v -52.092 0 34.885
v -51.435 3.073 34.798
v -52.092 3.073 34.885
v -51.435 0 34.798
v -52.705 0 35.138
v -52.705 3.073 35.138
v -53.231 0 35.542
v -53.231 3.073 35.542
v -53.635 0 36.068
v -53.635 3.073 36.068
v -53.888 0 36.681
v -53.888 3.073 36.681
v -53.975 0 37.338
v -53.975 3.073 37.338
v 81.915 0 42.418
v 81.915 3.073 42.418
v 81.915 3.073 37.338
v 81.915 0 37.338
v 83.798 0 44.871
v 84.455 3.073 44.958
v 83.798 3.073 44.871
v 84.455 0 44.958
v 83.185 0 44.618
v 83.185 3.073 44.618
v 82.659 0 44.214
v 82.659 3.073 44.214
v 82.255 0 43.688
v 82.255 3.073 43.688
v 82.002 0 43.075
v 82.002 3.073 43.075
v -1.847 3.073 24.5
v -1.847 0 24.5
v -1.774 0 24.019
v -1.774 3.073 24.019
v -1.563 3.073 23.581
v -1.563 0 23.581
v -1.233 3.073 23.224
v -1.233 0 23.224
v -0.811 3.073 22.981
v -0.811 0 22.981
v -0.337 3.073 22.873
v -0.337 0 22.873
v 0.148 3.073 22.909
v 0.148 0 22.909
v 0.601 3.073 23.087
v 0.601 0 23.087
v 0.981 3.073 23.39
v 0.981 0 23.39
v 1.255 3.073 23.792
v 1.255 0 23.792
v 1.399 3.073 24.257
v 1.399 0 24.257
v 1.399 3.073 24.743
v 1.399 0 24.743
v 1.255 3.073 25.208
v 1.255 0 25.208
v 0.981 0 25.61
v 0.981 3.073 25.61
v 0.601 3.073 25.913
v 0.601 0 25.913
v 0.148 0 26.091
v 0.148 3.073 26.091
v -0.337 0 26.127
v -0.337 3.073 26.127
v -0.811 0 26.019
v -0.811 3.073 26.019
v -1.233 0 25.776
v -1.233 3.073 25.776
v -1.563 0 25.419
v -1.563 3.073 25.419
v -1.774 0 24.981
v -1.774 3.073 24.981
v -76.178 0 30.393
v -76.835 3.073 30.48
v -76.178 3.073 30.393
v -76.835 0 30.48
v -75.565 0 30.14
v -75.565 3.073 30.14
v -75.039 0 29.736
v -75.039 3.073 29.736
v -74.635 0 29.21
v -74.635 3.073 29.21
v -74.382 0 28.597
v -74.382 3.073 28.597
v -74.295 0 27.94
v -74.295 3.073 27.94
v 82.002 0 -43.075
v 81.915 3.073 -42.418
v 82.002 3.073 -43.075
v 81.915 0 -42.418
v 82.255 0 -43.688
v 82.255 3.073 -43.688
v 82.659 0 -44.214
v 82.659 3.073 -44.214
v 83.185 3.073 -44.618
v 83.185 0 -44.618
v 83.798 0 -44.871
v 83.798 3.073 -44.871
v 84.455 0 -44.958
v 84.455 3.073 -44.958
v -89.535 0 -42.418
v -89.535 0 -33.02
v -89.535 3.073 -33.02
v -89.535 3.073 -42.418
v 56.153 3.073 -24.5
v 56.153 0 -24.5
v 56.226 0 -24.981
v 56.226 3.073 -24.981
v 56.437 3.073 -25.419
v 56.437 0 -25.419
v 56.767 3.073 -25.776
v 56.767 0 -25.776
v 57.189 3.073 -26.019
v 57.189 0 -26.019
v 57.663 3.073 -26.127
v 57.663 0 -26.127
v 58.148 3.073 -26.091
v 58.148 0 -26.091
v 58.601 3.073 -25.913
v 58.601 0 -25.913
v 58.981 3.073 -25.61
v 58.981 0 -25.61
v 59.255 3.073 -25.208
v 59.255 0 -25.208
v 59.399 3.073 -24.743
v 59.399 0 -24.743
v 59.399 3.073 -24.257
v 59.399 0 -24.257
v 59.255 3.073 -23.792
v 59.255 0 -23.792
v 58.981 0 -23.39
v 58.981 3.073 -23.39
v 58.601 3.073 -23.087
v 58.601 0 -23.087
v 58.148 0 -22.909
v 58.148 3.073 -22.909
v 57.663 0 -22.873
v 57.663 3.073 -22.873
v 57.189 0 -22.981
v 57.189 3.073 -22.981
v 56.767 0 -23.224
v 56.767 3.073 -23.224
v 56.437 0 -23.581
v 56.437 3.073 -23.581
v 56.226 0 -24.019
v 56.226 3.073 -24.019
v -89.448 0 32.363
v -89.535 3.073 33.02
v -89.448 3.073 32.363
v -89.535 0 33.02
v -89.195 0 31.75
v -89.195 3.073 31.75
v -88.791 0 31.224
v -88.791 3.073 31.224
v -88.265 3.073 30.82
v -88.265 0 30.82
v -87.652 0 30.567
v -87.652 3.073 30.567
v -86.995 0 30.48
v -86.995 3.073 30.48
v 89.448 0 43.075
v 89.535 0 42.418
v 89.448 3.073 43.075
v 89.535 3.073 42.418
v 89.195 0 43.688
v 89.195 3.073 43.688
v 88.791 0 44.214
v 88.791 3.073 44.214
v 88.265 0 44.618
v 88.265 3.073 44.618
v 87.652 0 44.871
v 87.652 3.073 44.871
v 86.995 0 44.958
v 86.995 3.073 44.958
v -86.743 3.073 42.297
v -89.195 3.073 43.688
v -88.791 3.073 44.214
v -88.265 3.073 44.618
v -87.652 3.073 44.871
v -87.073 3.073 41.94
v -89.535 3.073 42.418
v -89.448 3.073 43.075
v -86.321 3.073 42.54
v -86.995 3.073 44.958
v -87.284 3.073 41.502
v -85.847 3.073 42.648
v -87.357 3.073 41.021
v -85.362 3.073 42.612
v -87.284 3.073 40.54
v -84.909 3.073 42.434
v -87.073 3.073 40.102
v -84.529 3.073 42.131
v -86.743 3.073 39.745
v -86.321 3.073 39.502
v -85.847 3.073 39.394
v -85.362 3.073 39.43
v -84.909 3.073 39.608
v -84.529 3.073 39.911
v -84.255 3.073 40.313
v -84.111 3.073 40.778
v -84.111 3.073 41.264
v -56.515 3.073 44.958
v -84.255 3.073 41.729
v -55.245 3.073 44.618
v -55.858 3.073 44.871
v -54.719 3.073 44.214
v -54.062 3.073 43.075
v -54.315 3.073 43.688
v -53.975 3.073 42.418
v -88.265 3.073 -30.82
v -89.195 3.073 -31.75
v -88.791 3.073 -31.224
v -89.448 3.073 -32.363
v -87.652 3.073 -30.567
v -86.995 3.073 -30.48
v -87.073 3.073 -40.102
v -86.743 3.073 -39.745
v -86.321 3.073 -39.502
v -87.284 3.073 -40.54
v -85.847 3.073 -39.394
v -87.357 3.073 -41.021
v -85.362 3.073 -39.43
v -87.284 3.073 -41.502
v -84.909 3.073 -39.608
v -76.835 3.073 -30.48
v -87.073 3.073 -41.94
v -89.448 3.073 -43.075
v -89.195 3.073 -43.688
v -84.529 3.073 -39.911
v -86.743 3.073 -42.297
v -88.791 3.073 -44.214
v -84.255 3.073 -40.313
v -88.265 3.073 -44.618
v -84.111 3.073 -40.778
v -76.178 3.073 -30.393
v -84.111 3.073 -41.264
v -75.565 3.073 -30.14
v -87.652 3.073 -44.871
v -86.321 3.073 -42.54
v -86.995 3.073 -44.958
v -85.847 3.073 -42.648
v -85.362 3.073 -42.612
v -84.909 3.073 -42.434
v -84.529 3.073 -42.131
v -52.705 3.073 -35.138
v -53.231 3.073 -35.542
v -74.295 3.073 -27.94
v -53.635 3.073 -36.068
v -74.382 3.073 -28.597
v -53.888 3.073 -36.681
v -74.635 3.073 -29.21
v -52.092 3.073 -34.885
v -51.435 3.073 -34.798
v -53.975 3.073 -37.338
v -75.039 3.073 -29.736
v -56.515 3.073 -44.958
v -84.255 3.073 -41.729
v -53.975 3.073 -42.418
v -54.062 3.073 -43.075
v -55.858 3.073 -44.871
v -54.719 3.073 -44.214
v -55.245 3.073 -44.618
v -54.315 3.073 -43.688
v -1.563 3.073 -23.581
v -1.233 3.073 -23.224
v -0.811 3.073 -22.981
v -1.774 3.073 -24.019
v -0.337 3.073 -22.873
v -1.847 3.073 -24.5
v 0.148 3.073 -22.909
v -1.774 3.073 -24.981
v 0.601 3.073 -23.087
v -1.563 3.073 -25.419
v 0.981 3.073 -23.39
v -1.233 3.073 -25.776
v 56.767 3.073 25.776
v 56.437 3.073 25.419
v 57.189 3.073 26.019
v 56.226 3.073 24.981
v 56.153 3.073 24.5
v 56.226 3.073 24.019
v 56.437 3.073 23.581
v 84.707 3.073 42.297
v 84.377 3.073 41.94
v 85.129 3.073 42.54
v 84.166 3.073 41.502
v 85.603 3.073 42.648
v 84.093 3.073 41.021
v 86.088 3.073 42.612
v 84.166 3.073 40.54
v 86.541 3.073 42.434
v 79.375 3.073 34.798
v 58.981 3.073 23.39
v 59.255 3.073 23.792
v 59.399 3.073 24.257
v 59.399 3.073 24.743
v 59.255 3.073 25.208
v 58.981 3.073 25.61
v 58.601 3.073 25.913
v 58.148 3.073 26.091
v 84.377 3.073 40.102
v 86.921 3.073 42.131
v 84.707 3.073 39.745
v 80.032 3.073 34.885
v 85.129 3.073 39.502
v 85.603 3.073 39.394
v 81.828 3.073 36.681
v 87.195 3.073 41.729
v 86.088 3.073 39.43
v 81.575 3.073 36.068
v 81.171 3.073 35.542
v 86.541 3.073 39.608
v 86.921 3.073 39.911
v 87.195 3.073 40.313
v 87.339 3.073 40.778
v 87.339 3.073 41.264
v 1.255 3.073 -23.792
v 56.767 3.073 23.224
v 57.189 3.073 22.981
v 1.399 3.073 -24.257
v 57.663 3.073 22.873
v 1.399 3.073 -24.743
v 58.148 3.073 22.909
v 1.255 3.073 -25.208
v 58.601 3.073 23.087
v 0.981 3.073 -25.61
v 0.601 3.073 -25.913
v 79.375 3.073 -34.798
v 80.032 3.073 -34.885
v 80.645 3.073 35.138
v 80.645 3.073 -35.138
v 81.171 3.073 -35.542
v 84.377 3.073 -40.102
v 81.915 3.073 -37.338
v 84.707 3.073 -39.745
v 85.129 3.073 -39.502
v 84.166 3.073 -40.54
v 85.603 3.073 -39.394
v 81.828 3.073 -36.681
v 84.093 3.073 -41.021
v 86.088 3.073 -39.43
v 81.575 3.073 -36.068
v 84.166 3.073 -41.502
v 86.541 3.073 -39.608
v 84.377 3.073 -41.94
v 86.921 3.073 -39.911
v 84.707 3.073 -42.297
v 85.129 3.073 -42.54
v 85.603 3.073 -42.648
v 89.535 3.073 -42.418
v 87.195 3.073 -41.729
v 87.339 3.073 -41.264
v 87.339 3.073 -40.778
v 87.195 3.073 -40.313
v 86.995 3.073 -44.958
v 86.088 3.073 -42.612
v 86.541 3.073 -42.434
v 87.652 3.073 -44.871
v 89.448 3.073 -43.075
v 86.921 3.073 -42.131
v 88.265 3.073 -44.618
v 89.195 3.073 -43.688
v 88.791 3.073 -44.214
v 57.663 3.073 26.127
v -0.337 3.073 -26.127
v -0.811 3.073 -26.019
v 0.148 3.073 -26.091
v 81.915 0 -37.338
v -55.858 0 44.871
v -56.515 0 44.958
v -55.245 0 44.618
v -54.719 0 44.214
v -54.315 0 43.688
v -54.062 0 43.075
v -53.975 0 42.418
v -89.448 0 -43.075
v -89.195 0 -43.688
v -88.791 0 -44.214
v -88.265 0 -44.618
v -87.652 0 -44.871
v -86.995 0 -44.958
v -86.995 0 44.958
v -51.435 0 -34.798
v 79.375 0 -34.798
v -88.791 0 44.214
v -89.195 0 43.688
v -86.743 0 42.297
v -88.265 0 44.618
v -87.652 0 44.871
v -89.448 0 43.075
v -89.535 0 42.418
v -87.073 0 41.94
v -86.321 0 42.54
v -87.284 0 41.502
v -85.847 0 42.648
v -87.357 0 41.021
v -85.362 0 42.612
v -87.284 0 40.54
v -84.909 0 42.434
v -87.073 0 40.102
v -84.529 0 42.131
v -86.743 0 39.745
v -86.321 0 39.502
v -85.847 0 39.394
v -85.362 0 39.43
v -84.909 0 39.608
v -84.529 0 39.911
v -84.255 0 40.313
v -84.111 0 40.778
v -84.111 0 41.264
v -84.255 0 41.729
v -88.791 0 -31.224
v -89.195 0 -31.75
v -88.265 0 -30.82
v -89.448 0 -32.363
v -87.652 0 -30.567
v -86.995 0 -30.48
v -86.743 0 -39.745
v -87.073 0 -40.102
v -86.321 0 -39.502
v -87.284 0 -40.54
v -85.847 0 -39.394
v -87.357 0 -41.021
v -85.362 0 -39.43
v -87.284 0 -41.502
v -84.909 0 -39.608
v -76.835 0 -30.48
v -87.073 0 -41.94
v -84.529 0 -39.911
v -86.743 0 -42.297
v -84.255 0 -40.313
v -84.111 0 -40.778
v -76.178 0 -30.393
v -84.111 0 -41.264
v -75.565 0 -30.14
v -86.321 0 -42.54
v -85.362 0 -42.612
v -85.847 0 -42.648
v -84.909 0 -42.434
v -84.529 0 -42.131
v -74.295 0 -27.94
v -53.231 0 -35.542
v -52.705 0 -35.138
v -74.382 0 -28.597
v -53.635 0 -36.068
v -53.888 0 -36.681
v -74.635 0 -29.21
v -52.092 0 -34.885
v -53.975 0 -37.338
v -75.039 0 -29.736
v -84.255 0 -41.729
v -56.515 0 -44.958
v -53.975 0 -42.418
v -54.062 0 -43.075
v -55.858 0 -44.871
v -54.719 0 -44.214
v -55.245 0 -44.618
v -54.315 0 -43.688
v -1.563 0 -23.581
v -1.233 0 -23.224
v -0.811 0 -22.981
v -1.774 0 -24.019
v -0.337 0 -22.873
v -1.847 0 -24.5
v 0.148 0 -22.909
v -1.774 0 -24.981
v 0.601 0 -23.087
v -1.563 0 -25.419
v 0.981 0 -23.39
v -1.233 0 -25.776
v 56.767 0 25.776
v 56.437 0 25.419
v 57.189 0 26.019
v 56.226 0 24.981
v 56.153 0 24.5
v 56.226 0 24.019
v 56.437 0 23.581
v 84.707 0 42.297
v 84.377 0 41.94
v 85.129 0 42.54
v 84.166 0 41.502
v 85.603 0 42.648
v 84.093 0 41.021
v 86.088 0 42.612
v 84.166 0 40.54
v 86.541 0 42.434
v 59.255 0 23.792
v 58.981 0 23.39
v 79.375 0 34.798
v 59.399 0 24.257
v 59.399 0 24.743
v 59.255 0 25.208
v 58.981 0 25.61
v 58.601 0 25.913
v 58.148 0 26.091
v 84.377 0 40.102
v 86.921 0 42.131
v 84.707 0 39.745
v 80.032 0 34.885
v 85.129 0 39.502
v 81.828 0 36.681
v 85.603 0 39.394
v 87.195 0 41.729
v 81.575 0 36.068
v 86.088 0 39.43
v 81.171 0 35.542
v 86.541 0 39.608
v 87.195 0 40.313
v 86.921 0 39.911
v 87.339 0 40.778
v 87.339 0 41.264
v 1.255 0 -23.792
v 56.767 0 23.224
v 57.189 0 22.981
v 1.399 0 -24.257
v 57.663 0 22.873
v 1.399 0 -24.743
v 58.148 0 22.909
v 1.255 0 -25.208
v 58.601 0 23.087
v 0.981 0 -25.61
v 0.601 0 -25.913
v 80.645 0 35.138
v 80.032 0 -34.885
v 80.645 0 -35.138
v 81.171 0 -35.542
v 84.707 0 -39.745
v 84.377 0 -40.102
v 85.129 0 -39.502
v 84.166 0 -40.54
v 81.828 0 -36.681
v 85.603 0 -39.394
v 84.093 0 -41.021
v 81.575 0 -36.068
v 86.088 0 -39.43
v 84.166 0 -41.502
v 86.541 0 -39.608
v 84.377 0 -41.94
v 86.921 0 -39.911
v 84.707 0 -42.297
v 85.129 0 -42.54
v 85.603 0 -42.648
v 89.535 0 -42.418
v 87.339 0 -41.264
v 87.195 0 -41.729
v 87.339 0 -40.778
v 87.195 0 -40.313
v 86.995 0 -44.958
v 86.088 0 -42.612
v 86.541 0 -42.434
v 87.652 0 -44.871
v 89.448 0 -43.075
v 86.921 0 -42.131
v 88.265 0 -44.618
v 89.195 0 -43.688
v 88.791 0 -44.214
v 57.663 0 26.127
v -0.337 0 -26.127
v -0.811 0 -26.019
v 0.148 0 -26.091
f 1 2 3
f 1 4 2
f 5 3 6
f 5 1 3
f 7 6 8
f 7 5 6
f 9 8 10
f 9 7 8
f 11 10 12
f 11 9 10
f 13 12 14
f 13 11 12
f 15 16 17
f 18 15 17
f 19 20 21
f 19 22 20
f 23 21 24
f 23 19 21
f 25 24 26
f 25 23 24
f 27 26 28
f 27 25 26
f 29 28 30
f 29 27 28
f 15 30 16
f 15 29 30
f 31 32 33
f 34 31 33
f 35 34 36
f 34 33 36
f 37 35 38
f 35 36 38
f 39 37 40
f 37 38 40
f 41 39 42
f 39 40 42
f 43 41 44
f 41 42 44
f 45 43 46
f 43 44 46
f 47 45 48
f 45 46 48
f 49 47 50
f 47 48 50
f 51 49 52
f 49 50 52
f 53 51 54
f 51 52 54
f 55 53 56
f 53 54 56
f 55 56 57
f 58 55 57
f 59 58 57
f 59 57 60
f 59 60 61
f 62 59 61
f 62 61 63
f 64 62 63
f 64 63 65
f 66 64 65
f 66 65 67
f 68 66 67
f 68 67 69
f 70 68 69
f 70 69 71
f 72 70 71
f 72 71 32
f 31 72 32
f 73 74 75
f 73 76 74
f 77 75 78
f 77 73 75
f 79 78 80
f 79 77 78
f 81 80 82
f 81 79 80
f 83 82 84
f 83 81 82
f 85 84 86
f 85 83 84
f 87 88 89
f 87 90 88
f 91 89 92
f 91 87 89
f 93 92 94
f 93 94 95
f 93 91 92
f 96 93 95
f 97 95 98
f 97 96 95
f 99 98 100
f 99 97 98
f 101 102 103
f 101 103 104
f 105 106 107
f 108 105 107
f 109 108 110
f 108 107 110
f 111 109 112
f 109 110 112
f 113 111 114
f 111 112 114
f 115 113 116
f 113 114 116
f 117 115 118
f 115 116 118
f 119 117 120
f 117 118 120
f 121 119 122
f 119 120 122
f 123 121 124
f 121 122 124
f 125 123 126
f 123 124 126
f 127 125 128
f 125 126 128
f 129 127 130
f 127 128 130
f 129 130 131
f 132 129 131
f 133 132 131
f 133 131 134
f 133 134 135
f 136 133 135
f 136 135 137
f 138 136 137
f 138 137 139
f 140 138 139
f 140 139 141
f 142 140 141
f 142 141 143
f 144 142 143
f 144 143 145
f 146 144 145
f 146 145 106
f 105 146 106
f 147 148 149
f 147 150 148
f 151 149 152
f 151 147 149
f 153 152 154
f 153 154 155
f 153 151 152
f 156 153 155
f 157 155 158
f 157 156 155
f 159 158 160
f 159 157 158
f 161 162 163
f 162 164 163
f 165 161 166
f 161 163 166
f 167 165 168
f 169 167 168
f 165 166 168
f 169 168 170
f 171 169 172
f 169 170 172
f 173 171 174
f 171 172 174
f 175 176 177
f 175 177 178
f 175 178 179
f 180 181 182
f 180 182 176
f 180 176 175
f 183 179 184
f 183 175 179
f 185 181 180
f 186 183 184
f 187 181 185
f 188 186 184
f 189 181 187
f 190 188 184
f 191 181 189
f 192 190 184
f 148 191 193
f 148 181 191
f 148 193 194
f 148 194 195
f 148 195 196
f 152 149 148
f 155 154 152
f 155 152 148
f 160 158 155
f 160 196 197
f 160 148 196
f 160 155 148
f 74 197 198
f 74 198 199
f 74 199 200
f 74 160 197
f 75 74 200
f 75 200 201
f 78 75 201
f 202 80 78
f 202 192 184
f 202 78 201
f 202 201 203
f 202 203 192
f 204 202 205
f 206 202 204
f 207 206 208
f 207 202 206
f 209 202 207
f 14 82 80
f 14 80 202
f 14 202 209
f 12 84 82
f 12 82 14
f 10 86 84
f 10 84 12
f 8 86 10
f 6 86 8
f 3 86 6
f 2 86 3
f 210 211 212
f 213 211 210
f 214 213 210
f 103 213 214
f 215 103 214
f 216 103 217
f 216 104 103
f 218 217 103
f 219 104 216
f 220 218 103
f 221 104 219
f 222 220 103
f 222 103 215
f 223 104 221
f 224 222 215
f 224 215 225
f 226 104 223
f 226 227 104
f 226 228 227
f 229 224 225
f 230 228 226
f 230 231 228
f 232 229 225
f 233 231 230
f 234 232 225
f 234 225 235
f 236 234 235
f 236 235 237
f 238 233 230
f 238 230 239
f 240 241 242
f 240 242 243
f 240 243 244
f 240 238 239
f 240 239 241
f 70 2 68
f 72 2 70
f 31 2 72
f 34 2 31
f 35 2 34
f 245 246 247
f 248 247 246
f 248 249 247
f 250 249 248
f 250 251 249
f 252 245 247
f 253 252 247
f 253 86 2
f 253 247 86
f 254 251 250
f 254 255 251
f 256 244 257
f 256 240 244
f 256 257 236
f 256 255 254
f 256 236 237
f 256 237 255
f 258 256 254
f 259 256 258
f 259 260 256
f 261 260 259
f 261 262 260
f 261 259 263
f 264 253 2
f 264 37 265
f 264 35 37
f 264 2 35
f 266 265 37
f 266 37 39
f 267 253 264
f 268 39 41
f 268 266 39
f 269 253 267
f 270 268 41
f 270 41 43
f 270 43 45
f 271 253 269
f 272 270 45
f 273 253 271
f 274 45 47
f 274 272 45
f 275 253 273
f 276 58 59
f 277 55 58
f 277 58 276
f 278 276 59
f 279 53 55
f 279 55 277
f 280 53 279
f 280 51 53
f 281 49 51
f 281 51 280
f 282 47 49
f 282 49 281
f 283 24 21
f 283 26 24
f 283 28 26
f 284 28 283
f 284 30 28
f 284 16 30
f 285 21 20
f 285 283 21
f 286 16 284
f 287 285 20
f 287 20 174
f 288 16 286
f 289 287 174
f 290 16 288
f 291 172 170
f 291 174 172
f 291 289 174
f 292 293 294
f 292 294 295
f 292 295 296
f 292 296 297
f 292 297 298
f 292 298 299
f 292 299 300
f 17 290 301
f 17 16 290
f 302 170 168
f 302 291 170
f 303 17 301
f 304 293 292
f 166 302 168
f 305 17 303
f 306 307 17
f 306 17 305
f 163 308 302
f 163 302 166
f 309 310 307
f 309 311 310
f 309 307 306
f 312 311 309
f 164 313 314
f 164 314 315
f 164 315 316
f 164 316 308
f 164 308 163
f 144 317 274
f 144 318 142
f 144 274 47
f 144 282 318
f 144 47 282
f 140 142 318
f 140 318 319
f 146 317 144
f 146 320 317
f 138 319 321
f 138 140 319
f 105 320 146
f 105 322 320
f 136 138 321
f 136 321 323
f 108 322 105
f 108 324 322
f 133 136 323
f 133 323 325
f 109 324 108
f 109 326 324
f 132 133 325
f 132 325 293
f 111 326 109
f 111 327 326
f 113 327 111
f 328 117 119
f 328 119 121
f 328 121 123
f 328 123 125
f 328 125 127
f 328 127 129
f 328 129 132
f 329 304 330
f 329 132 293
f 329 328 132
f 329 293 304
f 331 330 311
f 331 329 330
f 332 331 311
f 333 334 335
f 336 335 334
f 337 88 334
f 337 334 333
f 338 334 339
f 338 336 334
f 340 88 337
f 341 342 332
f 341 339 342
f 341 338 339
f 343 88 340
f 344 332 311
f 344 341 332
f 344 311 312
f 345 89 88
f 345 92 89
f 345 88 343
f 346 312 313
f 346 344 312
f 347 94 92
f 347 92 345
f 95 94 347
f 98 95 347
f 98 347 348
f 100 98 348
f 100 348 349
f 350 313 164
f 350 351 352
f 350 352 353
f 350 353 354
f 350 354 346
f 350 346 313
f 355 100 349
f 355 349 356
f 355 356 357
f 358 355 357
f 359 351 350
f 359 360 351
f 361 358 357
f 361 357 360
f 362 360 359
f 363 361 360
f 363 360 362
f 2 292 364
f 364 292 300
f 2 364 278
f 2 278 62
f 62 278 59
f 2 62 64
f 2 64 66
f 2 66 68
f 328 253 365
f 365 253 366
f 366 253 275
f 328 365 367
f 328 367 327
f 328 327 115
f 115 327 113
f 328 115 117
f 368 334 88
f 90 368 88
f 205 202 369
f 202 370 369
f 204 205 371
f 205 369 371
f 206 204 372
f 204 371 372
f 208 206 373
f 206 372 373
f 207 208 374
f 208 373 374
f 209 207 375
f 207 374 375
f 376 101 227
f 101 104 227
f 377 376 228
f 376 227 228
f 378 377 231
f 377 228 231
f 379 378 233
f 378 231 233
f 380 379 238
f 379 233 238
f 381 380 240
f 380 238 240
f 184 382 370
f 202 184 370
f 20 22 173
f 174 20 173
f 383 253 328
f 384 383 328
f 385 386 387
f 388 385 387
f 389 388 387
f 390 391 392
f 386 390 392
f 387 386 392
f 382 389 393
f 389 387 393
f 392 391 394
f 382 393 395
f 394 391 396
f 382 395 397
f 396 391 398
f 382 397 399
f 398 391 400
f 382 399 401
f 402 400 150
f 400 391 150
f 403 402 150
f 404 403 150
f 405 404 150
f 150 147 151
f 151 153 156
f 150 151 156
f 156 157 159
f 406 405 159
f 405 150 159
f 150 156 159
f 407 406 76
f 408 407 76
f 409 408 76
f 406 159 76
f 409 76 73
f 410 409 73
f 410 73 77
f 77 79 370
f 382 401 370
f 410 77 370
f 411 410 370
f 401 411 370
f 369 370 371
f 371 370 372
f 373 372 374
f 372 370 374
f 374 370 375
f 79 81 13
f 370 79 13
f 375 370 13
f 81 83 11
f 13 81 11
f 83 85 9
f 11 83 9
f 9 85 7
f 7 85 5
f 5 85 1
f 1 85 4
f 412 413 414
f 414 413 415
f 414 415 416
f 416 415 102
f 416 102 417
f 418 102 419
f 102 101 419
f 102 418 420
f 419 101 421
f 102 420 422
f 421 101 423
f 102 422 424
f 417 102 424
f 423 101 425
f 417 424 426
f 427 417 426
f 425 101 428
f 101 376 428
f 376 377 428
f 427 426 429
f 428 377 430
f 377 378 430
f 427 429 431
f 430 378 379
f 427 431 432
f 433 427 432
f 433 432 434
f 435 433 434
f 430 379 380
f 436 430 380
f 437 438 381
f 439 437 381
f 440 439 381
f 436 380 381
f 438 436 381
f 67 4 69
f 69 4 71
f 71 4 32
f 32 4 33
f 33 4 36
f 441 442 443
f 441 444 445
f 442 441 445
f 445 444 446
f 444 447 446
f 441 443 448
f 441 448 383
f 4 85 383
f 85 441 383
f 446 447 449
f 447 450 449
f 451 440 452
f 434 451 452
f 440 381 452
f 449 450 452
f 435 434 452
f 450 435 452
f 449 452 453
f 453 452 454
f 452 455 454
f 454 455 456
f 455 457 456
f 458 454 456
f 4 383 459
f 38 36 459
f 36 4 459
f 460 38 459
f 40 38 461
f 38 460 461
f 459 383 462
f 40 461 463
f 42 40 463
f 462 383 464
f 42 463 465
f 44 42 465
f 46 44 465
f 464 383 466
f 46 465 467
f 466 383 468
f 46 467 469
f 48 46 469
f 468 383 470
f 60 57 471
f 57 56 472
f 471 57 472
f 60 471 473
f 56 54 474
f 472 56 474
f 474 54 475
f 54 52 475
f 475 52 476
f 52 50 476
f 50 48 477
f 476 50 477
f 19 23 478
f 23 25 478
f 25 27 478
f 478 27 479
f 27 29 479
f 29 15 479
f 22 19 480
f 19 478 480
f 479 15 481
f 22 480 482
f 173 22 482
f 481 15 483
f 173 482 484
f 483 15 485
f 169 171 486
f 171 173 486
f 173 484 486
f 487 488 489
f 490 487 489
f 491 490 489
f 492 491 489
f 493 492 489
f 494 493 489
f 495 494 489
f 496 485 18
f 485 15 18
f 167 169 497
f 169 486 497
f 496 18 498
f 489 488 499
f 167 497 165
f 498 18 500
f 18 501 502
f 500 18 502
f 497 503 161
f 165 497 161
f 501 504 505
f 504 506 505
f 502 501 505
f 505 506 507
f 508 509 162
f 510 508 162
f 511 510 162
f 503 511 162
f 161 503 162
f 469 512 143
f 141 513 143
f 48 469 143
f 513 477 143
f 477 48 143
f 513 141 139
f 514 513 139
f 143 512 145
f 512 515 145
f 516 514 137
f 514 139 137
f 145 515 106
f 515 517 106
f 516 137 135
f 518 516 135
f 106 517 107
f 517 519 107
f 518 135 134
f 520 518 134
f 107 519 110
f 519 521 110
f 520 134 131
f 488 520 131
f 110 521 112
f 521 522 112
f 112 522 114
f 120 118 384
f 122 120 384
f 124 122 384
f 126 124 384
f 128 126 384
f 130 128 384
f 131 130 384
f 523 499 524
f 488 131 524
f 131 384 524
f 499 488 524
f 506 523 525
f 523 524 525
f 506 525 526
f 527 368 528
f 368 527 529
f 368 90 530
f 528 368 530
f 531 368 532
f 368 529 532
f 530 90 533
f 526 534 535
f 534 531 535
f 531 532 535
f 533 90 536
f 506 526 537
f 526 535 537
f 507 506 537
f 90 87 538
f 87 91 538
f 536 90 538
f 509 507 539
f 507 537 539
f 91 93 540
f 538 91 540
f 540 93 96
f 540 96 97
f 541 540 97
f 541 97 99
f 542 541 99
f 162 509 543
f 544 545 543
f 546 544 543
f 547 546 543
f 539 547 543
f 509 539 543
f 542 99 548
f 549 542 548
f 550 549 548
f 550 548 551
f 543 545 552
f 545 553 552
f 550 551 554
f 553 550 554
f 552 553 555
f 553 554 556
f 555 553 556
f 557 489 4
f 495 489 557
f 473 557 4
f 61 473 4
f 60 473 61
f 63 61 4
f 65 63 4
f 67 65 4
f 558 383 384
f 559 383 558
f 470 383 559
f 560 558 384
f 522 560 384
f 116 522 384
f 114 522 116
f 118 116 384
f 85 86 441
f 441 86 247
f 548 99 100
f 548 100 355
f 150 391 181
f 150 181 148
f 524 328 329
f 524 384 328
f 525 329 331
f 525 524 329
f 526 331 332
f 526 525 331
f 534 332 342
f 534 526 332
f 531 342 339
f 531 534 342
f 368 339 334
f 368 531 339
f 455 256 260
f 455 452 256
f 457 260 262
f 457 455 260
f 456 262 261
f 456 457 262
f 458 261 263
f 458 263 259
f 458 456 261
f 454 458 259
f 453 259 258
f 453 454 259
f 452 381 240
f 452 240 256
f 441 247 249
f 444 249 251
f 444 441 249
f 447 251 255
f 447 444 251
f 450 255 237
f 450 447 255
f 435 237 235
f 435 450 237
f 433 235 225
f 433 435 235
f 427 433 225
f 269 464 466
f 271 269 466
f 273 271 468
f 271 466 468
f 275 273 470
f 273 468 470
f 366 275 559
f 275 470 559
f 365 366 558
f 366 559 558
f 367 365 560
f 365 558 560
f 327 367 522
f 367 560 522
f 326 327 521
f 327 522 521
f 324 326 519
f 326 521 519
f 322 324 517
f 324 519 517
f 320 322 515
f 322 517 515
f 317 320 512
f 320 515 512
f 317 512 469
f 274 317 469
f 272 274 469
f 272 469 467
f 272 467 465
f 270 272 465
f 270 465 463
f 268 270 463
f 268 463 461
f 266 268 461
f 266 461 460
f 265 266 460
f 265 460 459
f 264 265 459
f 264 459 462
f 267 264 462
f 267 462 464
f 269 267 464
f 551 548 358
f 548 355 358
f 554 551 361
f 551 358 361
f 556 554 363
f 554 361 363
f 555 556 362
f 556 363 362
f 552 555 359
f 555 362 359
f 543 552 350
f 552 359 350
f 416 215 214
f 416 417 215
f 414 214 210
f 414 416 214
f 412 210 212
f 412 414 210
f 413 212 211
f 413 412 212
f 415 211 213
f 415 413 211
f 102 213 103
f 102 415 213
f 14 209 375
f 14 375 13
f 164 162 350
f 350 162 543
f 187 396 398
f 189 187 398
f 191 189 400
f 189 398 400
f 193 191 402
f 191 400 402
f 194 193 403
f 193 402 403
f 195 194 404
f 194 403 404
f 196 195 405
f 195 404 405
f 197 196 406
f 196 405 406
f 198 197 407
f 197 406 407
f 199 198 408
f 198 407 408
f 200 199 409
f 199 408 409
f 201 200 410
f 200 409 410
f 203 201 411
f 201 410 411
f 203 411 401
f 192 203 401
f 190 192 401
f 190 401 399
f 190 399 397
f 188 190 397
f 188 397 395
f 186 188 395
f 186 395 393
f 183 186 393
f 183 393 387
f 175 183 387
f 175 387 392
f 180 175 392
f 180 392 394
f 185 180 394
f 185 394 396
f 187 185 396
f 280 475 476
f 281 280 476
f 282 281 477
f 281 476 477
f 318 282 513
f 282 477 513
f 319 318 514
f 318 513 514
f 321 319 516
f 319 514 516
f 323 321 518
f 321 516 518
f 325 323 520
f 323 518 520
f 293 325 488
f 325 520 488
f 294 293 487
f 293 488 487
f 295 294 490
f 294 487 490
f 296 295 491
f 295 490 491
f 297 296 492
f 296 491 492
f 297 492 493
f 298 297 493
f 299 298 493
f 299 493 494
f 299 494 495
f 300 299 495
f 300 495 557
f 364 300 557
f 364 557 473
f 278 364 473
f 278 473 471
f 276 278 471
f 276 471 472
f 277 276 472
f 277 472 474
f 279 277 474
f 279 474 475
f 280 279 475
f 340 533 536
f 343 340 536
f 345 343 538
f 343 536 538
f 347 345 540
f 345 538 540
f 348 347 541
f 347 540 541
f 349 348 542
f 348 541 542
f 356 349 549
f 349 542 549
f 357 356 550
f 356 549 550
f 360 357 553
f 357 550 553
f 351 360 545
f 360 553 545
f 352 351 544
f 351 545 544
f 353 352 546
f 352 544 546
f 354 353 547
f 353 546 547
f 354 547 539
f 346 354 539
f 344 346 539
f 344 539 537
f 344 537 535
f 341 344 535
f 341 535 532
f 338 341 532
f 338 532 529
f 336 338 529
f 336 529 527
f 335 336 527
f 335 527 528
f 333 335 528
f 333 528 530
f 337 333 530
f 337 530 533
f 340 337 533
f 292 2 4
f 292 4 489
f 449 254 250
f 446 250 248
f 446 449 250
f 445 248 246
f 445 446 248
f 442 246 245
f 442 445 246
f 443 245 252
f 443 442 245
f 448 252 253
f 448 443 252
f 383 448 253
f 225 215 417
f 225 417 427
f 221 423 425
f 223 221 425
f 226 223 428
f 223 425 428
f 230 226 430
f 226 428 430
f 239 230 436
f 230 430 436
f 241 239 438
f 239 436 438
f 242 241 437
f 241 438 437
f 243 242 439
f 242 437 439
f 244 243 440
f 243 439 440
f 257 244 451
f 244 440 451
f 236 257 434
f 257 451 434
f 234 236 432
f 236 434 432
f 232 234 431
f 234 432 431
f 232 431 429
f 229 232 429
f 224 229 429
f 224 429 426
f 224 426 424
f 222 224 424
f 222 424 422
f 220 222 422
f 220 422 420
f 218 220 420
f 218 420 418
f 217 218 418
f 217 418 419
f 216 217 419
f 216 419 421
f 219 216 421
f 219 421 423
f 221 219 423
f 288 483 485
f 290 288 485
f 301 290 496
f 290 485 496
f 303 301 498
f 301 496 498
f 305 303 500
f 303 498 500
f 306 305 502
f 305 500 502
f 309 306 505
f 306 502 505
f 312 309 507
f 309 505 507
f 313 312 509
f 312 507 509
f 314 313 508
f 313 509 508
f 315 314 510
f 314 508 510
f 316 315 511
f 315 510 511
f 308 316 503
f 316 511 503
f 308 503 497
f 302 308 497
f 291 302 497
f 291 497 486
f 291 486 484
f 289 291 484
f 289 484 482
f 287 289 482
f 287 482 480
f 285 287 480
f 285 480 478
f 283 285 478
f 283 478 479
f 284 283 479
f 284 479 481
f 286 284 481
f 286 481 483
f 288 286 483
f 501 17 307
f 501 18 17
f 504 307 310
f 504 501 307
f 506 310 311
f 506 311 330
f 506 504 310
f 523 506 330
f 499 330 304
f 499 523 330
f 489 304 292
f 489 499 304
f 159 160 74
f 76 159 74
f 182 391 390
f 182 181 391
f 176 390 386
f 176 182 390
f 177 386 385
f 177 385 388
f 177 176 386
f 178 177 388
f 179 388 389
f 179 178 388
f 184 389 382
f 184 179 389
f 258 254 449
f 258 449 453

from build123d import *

# Parameters (mm, degrees)
SKETCH1_W                    = 179.07
SKETCH1_H                    = 89.916
BOSS_EXTRUDE1_DEPTH          = 3.0734
F_30_0_1285_DIAMETER_HOLE1_D = 3.2639
F_30_0_1285_DIAMETER_HOLE2_D = 3.2639
SKETCH6_W                    = 15.24
SKETCH6_H                    = 60.96
SKETCH6_W_2                  = 135.89
SKETCH6_H_2                  = 10.16
CUT_EXTRUDE1_DEPTH           = 4.0734
FILLET2_R                    = 2.54


with BuildPart() as part:
    # Sketch1 → Boss-Extrude1 (new body)
    with BuildSketch(Plane(origin=(0, 0, 0), x_dir=(1, 0, 0), z_dir=(0, 1, 0))):
        Rectangle(SKETCH1_W, SKETCH1_H)
    extrude(amount=BOSS_EXTRUDE1_DEPTH)

    # #30 (0.1285) Diameter Hole1 (through all)
    with Locations(Plane(origin=(0, 3.0734, 0), x_dir=(1, 0, 0), z_dir=(0, 1, 0))):
        with Locations((-85.725, 41.021), (-85.725, -41.021), (85.725, -41.021), (85.725, 41.021)):
            Hole(F_30_0_1285_DIAMETER_HOLE1_D / 2)

    # #30 (0.1285) Diameter Hole2 (through all)
    with Locations(Plane(origin=(0, 3.0734, 0), x_dir=(1, 0, 0), z_dir=(0, 1, 0))):
        with Locations((-0.215, 24.5), (-0.215, -24.5), (57.785, -24.5), (57.785, 24.5)):
            Hole(F_30_0_1285_DIAMETER_HOLE2_D / 2)

    # Sketch6 → Cut-Extrude1 (cut, through all)
    with BuildSketch(Plane(origin=(0, 3.0734, 0), x_dir=(1, 0, 0), z_dir=(0, 1, 0))):
        with Locations((-81.915, 0)):
            Rectangle(SKETCH6_W, SKETCH6_H)
        with Locations((13.97, -39.878)):
            Rectangle(SKETCH6_W_2, SKETCH6_H_2)
        with Locations((13.97, 39.878)):
            Rectangle(SKETCH6_W_2, SKETCH6_H_2)
    extrude(amount=-CUT_EXTRUDE1_DEPTH, mode=Mode.SUBTRACT)

    # Fillet2
    fillet2_edges = [part.edges().sort_by_distance(p)[0] for p in [
        (-89.535, 1.5367, 30.48),
        (-89.535, 1.5367, -30.48),
        (-74.295, 1.5367, -30.48),
        (-74.295, 1.5367, 30.48),
        (-89.535, 1.5367, -44.958),
        (89.535, 1.5367, -44.958),
        (89.535, 1.5367, 44.958),
        (-89.535, 1.5367, 44.958),
        (-53.975, 1.5367, 44.958),
        (-53.975, 1.5367, 34.798),
        (81.915, 1.5367, 34.798),
        (81.915, 1.5367, 44.958),
        (-53.975, 1.5367, -34.798),
        (-53.975, 1.5367, -44.958),
        (81.915, 1.5367, -44.958),
        (81.915, 1.5367, -34.798),
    ]]
    fillet(fillet2_edges, radius=FILLET2_R)


solid = part.part
